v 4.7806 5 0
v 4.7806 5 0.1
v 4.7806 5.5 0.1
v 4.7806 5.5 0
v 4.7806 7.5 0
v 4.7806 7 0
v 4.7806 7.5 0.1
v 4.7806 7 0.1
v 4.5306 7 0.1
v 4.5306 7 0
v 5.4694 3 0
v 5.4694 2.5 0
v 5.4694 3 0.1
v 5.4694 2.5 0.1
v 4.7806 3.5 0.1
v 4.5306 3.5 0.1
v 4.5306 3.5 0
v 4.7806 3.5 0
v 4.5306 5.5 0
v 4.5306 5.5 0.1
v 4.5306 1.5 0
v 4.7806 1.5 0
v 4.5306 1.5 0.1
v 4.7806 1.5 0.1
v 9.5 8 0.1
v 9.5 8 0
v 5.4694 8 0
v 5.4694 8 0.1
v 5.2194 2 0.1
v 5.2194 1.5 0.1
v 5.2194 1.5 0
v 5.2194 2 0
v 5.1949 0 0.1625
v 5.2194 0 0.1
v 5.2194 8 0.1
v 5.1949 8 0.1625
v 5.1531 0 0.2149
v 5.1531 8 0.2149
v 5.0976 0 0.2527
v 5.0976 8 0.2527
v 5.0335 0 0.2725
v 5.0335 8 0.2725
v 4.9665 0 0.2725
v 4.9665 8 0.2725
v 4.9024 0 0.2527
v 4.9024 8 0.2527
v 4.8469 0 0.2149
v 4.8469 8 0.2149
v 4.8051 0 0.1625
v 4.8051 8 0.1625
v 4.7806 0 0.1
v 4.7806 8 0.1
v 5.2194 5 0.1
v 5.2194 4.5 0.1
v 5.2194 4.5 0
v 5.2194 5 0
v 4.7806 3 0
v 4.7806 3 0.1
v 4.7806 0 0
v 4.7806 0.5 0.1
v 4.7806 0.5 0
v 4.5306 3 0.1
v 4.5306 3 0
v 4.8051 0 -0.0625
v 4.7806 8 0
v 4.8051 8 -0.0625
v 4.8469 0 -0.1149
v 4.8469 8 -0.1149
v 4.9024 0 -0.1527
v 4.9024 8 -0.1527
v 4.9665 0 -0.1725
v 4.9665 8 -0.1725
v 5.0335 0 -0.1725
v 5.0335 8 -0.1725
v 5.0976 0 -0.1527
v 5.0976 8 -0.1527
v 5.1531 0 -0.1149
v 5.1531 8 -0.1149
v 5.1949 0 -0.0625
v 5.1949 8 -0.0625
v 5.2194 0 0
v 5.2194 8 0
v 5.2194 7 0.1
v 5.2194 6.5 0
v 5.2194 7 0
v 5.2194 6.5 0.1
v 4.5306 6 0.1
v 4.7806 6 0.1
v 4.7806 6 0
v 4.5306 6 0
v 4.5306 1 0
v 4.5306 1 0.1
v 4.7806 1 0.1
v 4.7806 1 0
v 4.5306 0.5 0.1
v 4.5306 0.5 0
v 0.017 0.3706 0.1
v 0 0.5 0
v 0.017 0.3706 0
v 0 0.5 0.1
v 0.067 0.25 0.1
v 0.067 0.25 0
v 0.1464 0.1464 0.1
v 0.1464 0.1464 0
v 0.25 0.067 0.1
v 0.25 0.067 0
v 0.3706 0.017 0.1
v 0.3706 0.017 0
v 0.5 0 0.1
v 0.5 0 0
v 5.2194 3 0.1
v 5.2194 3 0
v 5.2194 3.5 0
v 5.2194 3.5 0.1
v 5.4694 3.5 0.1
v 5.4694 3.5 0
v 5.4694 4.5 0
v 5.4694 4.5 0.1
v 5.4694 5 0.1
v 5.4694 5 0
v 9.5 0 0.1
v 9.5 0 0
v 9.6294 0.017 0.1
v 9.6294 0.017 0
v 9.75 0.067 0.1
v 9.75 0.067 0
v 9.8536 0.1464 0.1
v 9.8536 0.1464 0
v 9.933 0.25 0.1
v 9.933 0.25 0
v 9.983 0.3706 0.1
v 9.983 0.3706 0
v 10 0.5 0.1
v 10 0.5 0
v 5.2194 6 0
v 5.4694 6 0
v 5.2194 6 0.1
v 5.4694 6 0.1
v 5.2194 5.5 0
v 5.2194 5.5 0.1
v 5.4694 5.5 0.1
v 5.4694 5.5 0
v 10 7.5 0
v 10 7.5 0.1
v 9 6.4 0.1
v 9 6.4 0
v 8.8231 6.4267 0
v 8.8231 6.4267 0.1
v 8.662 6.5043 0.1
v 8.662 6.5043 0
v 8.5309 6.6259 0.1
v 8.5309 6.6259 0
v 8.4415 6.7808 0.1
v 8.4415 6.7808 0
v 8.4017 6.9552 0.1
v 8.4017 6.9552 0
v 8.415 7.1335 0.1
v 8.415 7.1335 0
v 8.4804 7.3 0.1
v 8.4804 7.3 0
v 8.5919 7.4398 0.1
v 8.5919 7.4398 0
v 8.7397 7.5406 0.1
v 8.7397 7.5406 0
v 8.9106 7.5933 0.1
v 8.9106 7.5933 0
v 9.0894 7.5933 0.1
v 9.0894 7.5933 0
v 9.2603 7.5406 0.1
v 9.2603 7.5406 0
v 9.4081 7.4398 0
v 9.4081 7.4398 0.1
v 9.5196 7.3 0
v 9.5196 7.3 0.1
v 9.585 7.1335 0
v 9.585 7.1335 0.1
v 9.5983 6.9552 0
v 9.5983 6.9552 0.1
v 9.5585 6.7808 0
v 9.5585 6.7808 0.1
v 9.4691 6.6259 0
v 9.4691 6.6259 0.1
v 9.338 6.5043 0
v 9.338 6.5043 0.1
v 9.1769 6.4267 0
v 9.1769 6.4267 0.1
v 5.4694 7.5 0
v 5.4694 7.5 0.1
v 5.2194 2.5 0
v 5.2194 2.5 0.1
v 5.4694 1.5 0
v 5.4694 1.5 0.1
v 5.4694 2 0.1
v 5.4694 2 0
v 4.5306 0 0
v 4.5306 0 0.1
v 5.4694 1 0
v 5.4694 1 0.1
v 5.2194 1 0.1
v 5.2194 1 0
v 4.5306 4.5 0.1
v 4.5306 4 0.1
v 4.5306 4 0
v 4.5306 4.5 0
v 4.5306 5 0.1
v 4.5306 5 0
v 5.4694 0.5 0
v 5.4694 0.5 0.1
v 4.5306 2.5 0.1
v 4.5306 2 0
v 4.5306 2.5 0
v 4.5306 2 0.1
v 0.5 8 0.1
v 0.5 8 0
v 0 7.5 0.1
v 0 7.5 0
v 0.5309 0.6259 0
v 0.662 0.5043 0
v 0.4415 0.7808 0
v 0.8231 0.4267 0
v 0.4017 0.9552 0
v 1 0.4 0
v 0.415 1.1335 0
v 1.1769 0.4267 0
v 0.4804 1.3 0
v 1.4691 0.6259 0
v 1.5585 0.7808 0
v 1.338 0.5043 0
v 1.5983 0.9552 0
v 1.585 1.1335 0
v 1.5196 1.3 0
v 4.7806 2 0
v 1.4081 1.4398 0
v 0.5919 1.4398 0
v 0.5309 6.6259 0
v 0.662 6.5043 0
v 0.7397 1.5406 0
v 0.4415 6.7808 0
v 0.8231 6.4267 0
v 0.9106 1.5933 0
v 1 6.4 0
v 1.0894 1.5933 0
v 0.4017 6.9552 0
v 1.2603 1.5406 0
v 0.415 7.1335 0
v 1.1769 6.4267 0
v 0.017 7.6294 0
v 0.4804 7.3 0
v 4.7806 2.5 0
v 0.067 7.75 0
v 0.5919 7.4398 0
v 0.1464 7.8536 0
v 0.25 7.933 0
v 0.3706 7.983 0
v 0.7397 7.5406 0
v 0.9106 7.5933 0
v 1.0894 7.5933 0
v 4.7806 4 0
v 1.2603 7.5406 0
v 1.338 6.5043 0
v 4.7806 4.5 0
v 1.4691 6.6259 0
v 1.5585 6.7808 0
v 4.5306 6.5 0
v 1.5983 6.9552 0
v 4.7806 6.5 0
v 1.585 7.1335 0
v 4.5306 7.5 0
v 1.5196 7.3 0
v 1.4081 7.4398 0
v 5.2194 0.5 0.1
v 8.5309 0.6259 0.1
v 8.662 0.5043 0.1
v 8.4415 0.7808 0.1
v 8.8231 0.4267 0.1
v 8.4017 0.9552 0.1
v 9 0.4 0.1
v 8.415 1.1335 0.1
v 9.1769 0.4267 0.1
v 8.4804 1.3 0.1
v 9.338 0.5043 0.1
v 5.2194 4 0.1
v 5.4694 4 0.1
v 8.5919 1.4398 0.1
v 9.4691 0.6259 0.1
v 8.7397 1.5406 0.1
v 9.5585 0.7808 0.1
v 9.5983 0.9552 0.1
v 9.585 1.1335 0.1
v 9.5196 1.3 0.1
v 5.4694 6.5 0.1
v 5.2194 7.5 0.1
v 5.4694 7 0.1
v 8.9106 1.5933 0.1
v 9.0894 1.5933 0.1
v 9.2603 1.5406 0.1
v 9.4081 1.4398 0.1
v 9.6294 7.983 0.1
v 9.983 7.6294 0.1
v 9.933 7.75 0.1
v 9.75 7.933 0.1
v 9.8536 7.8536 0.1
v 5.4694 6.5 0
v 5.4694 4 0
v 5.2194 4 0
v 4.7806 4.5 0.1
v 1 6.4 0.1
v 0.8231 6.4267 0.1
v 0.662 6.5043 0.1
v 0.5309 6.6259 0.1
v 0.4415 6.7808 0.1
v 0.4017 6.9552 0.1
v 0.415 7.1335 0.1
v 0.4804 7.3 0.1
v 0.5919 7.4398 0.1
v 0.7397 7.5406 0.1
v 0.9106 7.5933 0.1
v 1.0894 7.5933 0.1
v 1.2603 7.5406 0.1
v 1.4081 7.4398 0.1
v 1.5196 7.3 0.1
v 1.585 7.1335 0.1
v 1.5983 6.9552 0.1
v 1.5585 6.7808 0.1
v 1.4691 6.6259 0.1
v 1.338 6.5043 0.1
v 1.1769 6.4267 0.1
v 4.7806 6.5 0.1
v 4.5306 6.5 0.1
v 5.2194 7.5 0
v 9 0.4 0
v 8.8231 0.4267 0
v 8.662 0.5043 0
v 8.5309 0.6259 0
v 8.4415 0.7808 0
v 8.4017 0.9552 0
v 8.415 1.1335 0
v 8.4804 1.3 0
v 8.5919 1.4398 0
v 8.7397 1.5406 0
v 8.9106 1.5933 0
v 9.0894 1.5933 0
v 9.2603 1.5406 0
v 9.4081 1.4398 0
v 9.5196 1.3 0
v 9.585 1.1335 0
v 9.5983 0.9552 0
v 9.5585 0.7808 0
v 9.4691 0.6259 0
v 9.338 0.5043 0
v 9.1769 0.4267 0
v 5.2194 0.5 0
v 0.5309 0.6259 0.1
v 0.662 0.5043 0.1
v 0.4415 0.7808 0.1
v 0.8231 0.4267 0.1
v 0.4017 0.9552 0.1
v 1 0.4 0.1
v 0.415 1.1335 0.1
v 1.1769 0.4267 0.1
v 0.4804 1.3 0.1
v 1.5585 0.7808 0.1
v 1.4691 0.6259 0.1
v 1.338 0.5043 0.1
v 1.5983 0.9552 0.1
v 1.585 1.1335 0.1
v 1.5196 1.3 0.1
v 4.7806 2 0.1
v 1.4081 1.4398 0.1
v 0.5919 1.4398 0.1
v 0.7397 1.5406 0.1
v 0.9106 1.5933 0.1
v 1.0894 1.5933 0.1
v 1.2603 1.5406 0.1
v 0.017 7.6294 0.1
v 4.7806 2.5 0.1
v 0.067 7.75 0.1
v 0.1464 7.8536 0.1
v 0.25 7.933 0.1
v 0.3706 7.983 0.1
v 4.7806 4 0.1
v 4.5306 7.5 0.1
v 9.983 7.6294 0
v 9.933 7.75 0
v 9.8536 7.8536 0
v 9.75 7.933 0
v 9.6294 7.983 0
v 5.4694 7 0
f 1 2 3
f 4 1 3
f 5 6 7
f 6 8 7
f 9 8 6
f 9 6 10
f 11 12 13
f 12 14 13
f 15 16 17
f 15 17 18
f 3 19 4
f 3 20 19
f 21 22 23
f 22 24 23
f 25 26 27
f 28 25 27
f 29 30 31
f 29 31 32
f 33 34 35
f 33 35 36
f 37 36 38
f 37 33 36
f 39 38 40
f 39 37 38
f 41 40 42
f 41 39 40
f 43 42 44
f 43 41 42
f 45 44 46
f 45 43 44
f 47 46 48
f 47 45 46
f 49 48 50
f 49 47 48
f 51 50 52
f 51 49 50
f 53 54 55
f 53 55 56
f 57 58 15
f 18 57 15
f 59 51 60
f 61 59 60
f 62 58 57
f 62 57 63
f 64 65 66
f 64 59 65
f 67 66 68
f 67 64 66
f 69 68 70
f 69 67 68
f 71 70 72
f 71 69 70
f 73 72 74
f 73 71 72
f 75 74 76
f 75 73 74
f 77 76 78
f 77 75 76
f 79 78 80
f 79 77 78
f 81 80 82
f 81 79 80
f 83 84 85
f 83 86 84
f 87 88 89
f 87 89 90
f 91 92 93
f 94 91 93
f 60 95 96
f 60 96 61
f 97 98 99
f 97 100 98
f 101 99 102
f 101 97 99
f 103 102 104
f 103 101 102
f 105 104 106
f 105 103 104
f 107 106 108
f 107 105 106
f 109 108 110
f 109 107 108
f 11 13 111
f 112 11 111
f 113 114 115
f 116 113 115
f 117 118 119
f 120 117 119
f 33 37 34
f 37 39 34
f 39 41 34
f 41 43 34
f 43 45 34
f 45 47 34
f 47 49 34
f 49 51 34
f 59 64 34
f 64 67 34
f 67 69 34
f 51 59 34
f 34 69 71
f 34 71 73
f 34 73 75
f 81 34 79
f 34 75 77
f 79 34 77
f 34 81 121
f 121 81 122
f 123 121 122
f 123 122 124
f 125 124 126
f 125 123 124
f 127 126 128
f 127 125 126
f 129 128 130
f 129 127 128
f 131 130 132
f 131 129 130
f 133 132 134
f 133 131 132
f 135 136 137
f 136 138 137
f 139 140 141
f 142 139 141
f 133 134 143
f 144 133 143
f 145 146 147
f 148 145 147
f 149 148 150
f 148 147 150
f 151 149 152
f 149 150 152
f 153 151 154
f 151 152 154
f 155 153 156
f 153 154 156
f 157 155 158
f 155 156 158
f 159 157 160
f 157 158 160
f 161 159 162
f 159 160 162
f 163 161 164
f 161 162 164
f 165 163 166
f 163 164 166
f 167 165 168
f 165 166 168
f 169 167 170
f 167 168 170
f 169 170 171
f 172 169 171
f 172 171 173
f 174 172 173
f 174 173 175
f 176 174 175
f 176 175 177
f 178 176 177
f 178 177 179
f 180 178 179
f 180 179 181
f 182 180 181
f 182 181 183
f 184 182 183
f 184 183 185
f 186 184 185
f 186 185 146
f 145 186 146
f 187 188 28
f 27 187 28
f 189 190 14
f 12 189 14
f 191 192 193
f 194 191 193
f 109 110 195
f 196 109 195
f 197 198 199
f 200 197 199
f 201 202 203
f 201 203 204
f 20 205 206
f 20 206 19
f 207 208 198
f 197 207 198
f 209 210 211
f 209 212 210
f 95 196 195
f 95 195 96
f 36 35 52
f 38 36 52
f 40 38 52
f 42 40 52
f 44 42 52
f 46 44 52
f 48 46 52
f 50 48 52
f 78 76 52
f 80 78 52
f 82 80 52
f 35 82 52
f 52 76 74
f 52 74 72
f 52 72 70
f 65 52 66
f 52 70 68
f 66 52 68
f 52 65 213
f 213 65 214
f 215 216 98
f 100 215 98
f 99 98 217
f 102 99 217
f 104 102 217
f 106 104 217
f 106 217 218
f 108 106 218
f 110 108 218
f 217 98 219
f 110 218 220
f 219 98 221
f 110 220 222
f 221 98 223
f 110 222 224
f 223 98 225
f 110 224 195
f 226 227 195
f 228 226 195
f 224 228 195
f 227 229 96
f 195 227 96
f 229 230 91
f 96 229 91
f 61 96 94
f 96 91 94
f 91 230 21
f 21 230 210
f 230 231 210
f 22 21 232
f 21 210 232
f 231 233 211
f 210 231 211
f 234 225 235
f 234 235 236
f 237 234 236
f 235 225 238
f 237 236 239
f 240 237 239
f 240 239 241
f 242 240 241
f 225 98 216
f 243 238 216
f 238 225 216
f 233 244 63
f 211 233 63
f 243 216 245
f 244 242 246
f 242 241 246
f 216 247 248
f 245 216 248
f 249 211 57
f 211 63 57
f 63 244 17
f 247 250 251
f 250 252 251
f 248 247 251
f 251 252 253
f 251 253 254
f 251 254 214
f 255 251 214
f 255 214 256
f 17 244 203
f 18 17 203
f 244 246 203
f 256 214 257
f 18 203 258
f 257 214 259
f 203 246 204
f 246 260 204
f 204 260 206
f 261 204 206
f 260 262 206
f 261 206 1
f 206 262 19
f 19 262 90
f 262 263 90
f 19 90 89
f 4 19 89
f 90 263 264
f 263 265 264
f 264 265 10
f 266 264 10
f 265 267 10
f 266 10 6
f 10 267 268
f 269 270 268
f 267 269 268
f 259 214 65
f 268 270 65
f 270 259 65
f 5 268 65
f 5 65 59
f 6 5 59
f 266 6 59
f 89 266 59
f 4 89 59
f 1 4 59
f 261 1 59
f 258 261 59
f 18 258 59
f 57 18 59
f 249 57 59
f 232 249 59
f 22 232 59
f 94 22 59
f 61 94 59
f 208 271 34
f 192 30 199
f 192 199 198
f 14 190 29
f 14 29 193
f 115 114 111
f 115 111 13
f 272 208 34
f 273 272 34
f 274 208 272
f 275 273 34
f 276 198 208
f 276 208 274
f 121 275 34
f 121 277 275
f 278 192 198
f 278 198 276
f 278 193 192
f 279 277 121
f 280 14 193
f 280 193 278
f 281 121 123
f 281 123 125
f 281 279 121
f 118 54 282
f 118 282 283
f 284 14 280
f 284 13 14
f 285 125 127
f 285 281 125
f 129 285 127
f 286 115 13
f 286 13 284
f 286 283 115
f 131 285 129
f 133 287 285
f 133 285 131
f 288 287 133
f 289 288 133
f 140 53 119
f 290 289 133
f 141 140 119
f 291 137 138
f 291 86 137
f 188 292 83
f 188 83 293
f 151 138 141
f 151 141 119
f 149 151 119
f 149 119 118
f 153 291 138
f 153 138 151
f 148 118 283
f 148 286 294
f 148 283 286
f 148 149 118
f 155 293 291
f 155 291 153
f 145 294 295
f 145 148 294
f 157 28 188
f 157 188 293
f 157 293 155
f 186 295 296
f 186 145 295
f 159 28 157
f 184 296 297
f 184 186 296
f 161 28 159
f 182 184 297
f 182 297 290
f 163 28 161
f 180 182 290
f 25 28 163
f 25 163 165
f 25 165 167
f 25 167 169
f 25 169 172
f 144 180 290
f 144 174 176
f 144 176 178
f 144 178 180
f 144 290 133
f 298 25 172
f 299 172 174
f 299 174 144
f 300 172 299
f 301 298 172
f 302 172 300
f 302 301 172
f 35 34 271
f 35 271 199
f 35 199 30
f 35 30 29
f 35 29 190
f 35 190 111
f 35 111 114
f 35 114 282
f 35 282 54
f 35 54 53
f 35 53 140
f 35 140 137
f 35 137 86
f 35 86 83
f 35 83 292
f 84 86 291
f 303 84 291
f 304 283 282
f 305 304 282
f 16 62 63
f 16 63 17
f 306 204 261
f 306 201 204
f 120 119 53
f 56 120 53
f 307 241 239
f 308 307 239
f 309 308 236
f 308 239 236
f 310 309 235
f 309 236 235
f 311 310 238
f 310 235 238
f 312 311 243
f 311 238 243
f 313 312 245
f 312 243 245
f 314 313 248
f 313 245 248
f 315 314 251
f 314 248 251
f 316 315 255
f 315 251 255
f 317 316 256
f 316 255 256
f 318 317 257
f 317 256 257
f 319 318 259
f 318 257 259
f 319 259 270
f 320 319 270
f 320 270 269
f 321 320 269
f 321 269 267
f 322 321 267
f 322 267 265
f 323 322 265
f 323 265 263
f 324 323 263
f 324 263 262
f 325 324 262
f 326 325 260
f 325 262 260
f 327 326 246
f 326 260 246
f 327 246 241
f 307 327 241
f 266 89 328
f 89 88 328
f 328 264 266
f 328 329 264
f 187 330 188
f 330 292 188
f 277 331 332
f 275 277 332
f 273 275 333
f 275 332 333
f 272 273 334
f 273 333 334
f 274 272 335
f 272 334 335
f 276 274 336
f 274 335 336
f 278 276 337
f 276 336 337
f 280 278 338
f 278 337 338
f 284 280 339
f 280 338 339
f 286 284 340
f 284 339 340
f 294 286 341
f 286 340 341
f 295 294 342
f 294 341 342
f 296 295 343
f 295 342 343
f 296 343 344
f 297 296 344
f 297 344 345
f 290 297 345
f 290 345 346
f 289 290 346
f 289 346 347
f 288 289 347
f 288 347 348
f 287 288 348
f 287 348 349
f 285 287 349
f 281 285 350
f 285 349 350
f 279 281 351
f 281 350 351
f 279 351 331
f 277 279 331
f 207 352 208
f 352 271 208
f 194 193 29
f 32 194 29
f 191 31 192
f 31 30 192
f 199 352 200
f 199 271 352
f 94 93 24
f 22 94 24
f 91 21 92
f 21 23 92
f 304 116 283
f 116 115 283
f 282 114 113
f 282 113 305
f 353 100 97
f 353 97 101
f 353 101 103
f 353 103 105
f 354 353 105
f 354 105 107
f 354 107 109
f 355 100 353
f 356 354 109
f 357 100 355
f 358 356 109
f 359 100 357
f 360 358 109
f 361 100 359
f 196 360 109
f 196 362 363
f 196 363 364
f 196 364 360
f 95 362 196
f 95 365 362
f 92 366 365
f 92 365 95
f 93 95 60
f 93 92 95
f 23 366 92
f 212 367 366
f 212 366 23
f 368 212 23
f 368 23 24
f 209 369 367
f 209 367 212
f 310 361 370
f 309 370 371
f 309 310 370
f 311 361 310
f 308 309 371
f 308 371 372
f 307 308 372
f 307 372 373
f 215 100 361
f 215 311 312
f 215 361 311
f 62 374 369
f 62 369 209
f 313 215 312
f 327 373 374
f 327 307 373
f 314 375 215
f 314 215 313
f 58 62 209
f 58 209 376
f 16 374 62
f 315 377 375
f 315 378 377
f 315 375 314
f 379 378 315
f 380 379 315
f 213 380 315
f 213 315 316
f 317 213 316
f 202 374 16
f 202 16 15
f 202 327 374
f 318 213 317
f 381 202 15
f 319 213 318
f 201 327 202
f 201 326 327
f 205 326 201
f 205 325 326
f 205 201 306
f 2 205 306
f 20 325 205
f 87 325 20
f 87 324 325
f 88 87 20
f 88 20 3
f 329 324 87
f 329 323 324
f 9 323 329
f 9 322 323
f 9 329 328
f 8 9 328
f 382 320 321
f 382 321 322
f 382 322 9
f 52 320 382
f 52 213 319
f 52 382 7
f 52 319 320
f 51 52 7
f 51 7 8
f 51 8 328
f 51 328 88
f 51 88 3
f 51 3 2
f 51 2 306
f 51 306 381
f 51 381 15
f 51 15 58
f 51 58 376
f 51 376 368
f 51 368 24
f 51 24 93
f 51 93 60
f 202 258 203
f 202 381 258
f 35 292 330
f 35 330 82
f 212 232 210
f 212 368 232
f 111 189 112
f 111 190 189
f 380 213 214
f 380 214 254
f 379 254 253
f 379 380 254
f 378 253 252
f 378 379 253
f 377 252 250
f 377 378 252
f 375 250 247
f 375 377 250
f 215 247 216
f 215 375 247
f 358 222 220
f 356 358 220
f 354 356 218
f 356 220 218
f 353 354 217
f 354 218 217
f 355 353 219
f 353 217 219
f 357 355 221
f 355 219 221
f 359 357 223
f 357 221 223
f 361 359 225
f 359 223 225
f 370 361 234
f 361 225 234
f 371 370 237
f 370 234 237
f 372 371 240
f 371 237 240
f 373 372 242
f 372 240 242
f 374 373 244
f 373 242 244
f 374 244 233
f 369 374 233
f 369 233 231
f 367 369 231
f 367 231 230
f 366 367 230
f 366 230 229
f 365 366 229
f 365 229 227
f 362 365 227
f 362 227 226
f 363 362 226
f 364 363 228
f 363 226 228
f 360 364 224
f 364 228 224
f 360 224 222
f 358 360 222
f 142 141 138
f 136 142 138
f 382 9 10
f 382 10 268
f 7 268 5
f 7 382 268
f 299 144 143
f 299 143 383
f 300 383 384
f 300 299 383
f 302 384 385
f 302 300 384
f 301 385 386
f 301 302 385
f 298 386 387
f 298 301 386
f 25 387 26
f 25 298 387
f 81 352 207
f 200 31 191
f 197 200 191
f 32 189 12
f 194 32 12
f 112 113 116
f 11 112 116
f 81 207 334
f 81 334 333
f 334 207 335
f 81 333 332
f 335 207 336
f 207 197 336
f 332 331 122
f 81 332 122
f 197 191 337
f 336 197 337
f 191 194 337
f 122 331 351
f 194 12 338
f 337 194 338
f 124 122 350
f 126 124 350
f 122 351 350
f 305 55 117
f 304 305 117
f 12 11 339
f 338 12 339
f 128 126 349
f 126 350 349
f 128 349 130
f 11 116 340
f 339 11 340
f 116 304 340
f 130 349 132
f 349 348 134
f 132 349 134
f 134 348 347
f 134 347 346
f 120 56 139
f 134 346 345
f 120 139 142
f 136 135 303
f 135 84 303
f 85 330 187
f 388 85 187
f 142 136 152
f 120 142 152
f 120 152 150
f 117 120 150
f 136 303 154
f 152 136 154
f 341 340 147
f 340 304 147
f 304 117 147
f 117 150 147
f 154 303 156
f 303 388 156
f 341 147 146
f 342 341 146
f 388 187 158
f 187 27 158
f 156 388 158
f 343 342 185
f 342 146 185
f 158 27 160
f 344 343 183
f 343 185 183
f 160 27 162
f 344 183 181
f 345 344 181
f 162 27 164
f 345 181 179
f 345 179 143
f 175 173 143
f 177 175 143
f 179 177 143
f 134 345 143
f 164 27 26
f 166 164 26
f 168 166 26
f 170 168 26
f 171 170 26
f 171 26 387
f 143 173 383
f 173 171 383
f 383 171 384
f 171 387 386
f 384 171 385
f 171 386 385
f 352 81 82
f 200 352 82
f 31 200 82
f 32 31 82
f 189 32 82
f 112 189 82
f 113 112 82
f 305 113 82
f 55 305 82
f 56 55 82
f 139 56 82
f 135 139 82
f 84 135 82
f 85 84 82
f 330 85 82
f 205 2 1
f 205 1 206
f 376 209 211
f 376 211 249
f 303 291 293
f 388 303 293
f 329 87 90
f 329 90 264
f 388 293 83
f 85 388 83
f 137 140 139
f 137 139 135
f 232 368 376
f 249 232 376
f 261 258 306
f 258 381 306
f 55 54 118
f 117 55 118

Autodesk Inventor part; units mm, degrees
ref_plane "YZ Plane" through (0, 0, 0) normal (1, 0, 0) x (0, 1, 0)
ref_plane "XZ Plane" through (0, 0, 0) normal (0, 1, 0) x (-1, 0, 0)
ref_plane "XY Plane" through (0, 0, 0) normal (0, 0, 1) x (1, 0, 0)
sketch "Sketch1" plane through (0, 0, 0) normal (0, 0, 1) x (1, 0, 0)
  line L0 (0, 0) -> (10, 0)
  line L1 (10, 0) -> (10, 8)
  line L2 (10, 8) -> (0, 8)
  line L3 (0, 8) -> (0, 0)
  dimension "d0" = 10
  dimension "d1" = 8
extrude "Extrusion1" add sketch "Sketch1" along normal blind 0.1
sketch "Sketch2" plane through (0, 0, 0) normal (0, -1, 0) x (1, 0, 0)
  circle A0 centre (5, 0.05) radius 0.225
  dimension "d4" = 0.45
extrude "Extrusion2" add sketch "Sketch2" against normal blind 8
sketch "Sketch3" plane through (0, 0, 0.1) normal (0, 0, 1) x (1, 0, 0)
  point P0 (1, 7)
  point P1 (1, 1)
hole "Hole1" at (1, 7, 0.1) at (1, 1, 0.1) direction (0, 0, -1) diameter 1.2 end through all
sketch "Sketch4" plane through (0, 0, 0.1) normal (0, 0, 1) x (1, 0, 0)
  point P0 (0, 0)
  point P1 (9, 7)
  point P2 (9, 1)
hole "Hole2" at (9, 7, 0.1) at (9, 1, 0.1) direction (0, 0, -1) diameter 1.2 end through all
sketch "Sketch5" plane through (0, 0, 0.1) normal (0, 0, 1) x (1, 0, 0)
  line L0 (4.7806, 0) -> (4.7806, 8) projected
  line L1 (4.7806, 0) -> (4.5306, 0)
  line L2 (4.5306, 0) -> (4.5306, 0.5)
  line L3 (4.5306, 0.5) -> (4.7806, 0.5)
  line L4 (4.7806, 0.5) -> (4.7806, 0)
  line L5 (4.5306, 1) -> (4.7806, 1)
  line L6 (4.7806, 1) -> (4.7806, 1.5)
  line L7 (4.7806, 1.5) -> (4.5306, 1.5)
  line L8 (4.5306, 1.5) -> (4.5306, 1)
  line L9 (4.7806, 2) -> (4.5306, 2)
  line L10 (4.5306, 2) -> (4.5306, 2.5)
  line L11 (4.5306, 2.5) -> (4.7806, 2.5)
  line L12 (4.7806, 2.5) -> (4.7806, 2)
  line L13 (4.7806, 3) -> (4.5306, 3)
  line L14 (4.5306, 3) -> (4.5306, 3.5)
  line L15 (4.5306, 3.5) -> (4.7806, 3.5)
  line L16 (4.7806, 3.5) -> (4.7806, 3)
  line L17 (4.7806, 4) -> (4.5306, 4)
  line L18 (4.5306, 4) -> (4.5306, 4.5)
  line L19 (4.5306, 4.5) -> (4.7806, 4.5)
  line L20 (4.7806, 4.5) -> (4.7806, 4)
  line L21 (4.7806, 5) -> (4.5306, 5)
  line L22 (4.5306, 5) -> (4.5306, 5.5)
  line L23 (4.5306, 5.5) -> (4.7806, 5.5)
  line L24 (4.7806, 5.5) -> (4.7806, 5)
  line L25 (4.7806, 6) -> (4.5306, 6)
  line L26 (4.5306, 6) -> (4.5306, 6.5)
  line L27 (4.5306, 6.5) -> (4.7806, 6.5)
  line L28 (4.7806, 6.5) -> (4.7806, 6)
  line L29 (4.7806, 7) -> (4.5306, 7)
  line L30 (4.5306, 7) -> (4.5306, 7.5)
  line L31 (4.5306, 7.5) -> (4.7806, 7.5)
  line L32 (4.7806, 7.5) -> (4.7806, 7)
  dimension "d21" = 0.25
  dimension "d22" = 0.5
  dimension "d23" = 0.5
  dimension "d24" = 0.5
  dimension "d25" = 0.5
  dimension "d26" = 0.5
  dimension "d27" = 0.5
  dimension "d28" = 0.5
  dimension "d29" = 0.5
extrude "Extrusion3" cut sketch "Sketch5" against normal blind 8
sketch "Sketch6" plane through (0, 0, 0.1) normal (0, 0, 1) x (1, 0, 0)
  line L0 (10, 8) -> (5.2194, 8) projected
  line L1 (5.2194, 0) -> (5.2194, 8) projected
  line L2 (5.2194, 0.5) -> (5.4694, 0.5)
  line L3 (5.4694, 0.5) -> (5.4694, 1)
  line L4 (5.4694, 1) -> (5.2194, 1)
  line L5 (5.2194, 1) -> (5.2194, 0.5)
  line L6 (5.2194, 1.5) -> (5.4694, 1.5)
  line L7 (5.4694, 1.5) -> (5.4694, 2)
  line L8 (5.4694, 2) -> (5.2194, 2)
  line L9 (5.2194, 2) -> (5.2194, 1.5)
  line L10 (5.2194, 2.5) -> (5.4694, 2.5)
  line L11 (5.4694, 2.5) -> (5.4694, 3)
  line L12 (5.4694, 3) -> (5.2194, 3)
  line L13 (5.2194, 3) -> (5.2194, 2.5)
  line L14 (5.2194, 3.5) -> (5.4694, 3.5)
  line L15 (5.4694, 3.5) -> (5.4694, 4)
  line L16 (5.4694, 4) -> (5.2194, 4)
  line L17 (5.2194, 4) -> (5.2194, 3.5)
  line L18 (5.2194, 4.5) -> (5.4694, 4.5)
  line L19 (5.4694, 4.5) -> (5.4694, 5)
  line L20 (5.4694, 5) -> (5.2194, 5)
  line L21 (5.2194, 5) -> (5.2194, 4.5)
  line L22 (5.2194, 5.5) -> (5.4694, 5.5)
  line L23 (5.4694, 5.5) -> (5.4694, 6)
  line L24 (5.4694, 6) -> (5.2194, 6)
  line L25 (5.2194, 6) -> (5.2194, 5.5)
  line L26 (5.2194, 6.5) -> (5.4694, 6.5)
  line L27 (5.4694, 6.5) -> (5.4694, 7)
  line L28 (5.4694, 7) -> (5.2194, 7)
  line L29 (5.2194, 7) -> (5.2194, 6.5)
  line L30 (5.2194, 7.5) -> (5.4694, 7.5)
  line L31 (5.4694, 7.5) -> (5.4694, 8)
  line L32 (5.4694, 8) -> (5.2194, 8)
  line L33 (5.2194, 8) -> (5.2194, 7.5)
  point P0 (0, 0)
  dimension "d32" = 0.25
  dimension "d33" = 0.5
  dimension "d36" = 0.5
  dimension "d37" = 0.5
  dimension "d38" = 0.5
  dimension "d39" = 0.5
  dimension "d40" = 0.5
  dimension "d41" = 0.5
extrude "Extrusion4" cut sketch "Sketch6" against normal blind 8
fillet "Fillet1" radius 0.5 4 edges at (0, 0, 0.05) (0, 8, 0.05) (10, 8, 0.05) (10, 0, 0.05)
properties part number "Scharnier"
